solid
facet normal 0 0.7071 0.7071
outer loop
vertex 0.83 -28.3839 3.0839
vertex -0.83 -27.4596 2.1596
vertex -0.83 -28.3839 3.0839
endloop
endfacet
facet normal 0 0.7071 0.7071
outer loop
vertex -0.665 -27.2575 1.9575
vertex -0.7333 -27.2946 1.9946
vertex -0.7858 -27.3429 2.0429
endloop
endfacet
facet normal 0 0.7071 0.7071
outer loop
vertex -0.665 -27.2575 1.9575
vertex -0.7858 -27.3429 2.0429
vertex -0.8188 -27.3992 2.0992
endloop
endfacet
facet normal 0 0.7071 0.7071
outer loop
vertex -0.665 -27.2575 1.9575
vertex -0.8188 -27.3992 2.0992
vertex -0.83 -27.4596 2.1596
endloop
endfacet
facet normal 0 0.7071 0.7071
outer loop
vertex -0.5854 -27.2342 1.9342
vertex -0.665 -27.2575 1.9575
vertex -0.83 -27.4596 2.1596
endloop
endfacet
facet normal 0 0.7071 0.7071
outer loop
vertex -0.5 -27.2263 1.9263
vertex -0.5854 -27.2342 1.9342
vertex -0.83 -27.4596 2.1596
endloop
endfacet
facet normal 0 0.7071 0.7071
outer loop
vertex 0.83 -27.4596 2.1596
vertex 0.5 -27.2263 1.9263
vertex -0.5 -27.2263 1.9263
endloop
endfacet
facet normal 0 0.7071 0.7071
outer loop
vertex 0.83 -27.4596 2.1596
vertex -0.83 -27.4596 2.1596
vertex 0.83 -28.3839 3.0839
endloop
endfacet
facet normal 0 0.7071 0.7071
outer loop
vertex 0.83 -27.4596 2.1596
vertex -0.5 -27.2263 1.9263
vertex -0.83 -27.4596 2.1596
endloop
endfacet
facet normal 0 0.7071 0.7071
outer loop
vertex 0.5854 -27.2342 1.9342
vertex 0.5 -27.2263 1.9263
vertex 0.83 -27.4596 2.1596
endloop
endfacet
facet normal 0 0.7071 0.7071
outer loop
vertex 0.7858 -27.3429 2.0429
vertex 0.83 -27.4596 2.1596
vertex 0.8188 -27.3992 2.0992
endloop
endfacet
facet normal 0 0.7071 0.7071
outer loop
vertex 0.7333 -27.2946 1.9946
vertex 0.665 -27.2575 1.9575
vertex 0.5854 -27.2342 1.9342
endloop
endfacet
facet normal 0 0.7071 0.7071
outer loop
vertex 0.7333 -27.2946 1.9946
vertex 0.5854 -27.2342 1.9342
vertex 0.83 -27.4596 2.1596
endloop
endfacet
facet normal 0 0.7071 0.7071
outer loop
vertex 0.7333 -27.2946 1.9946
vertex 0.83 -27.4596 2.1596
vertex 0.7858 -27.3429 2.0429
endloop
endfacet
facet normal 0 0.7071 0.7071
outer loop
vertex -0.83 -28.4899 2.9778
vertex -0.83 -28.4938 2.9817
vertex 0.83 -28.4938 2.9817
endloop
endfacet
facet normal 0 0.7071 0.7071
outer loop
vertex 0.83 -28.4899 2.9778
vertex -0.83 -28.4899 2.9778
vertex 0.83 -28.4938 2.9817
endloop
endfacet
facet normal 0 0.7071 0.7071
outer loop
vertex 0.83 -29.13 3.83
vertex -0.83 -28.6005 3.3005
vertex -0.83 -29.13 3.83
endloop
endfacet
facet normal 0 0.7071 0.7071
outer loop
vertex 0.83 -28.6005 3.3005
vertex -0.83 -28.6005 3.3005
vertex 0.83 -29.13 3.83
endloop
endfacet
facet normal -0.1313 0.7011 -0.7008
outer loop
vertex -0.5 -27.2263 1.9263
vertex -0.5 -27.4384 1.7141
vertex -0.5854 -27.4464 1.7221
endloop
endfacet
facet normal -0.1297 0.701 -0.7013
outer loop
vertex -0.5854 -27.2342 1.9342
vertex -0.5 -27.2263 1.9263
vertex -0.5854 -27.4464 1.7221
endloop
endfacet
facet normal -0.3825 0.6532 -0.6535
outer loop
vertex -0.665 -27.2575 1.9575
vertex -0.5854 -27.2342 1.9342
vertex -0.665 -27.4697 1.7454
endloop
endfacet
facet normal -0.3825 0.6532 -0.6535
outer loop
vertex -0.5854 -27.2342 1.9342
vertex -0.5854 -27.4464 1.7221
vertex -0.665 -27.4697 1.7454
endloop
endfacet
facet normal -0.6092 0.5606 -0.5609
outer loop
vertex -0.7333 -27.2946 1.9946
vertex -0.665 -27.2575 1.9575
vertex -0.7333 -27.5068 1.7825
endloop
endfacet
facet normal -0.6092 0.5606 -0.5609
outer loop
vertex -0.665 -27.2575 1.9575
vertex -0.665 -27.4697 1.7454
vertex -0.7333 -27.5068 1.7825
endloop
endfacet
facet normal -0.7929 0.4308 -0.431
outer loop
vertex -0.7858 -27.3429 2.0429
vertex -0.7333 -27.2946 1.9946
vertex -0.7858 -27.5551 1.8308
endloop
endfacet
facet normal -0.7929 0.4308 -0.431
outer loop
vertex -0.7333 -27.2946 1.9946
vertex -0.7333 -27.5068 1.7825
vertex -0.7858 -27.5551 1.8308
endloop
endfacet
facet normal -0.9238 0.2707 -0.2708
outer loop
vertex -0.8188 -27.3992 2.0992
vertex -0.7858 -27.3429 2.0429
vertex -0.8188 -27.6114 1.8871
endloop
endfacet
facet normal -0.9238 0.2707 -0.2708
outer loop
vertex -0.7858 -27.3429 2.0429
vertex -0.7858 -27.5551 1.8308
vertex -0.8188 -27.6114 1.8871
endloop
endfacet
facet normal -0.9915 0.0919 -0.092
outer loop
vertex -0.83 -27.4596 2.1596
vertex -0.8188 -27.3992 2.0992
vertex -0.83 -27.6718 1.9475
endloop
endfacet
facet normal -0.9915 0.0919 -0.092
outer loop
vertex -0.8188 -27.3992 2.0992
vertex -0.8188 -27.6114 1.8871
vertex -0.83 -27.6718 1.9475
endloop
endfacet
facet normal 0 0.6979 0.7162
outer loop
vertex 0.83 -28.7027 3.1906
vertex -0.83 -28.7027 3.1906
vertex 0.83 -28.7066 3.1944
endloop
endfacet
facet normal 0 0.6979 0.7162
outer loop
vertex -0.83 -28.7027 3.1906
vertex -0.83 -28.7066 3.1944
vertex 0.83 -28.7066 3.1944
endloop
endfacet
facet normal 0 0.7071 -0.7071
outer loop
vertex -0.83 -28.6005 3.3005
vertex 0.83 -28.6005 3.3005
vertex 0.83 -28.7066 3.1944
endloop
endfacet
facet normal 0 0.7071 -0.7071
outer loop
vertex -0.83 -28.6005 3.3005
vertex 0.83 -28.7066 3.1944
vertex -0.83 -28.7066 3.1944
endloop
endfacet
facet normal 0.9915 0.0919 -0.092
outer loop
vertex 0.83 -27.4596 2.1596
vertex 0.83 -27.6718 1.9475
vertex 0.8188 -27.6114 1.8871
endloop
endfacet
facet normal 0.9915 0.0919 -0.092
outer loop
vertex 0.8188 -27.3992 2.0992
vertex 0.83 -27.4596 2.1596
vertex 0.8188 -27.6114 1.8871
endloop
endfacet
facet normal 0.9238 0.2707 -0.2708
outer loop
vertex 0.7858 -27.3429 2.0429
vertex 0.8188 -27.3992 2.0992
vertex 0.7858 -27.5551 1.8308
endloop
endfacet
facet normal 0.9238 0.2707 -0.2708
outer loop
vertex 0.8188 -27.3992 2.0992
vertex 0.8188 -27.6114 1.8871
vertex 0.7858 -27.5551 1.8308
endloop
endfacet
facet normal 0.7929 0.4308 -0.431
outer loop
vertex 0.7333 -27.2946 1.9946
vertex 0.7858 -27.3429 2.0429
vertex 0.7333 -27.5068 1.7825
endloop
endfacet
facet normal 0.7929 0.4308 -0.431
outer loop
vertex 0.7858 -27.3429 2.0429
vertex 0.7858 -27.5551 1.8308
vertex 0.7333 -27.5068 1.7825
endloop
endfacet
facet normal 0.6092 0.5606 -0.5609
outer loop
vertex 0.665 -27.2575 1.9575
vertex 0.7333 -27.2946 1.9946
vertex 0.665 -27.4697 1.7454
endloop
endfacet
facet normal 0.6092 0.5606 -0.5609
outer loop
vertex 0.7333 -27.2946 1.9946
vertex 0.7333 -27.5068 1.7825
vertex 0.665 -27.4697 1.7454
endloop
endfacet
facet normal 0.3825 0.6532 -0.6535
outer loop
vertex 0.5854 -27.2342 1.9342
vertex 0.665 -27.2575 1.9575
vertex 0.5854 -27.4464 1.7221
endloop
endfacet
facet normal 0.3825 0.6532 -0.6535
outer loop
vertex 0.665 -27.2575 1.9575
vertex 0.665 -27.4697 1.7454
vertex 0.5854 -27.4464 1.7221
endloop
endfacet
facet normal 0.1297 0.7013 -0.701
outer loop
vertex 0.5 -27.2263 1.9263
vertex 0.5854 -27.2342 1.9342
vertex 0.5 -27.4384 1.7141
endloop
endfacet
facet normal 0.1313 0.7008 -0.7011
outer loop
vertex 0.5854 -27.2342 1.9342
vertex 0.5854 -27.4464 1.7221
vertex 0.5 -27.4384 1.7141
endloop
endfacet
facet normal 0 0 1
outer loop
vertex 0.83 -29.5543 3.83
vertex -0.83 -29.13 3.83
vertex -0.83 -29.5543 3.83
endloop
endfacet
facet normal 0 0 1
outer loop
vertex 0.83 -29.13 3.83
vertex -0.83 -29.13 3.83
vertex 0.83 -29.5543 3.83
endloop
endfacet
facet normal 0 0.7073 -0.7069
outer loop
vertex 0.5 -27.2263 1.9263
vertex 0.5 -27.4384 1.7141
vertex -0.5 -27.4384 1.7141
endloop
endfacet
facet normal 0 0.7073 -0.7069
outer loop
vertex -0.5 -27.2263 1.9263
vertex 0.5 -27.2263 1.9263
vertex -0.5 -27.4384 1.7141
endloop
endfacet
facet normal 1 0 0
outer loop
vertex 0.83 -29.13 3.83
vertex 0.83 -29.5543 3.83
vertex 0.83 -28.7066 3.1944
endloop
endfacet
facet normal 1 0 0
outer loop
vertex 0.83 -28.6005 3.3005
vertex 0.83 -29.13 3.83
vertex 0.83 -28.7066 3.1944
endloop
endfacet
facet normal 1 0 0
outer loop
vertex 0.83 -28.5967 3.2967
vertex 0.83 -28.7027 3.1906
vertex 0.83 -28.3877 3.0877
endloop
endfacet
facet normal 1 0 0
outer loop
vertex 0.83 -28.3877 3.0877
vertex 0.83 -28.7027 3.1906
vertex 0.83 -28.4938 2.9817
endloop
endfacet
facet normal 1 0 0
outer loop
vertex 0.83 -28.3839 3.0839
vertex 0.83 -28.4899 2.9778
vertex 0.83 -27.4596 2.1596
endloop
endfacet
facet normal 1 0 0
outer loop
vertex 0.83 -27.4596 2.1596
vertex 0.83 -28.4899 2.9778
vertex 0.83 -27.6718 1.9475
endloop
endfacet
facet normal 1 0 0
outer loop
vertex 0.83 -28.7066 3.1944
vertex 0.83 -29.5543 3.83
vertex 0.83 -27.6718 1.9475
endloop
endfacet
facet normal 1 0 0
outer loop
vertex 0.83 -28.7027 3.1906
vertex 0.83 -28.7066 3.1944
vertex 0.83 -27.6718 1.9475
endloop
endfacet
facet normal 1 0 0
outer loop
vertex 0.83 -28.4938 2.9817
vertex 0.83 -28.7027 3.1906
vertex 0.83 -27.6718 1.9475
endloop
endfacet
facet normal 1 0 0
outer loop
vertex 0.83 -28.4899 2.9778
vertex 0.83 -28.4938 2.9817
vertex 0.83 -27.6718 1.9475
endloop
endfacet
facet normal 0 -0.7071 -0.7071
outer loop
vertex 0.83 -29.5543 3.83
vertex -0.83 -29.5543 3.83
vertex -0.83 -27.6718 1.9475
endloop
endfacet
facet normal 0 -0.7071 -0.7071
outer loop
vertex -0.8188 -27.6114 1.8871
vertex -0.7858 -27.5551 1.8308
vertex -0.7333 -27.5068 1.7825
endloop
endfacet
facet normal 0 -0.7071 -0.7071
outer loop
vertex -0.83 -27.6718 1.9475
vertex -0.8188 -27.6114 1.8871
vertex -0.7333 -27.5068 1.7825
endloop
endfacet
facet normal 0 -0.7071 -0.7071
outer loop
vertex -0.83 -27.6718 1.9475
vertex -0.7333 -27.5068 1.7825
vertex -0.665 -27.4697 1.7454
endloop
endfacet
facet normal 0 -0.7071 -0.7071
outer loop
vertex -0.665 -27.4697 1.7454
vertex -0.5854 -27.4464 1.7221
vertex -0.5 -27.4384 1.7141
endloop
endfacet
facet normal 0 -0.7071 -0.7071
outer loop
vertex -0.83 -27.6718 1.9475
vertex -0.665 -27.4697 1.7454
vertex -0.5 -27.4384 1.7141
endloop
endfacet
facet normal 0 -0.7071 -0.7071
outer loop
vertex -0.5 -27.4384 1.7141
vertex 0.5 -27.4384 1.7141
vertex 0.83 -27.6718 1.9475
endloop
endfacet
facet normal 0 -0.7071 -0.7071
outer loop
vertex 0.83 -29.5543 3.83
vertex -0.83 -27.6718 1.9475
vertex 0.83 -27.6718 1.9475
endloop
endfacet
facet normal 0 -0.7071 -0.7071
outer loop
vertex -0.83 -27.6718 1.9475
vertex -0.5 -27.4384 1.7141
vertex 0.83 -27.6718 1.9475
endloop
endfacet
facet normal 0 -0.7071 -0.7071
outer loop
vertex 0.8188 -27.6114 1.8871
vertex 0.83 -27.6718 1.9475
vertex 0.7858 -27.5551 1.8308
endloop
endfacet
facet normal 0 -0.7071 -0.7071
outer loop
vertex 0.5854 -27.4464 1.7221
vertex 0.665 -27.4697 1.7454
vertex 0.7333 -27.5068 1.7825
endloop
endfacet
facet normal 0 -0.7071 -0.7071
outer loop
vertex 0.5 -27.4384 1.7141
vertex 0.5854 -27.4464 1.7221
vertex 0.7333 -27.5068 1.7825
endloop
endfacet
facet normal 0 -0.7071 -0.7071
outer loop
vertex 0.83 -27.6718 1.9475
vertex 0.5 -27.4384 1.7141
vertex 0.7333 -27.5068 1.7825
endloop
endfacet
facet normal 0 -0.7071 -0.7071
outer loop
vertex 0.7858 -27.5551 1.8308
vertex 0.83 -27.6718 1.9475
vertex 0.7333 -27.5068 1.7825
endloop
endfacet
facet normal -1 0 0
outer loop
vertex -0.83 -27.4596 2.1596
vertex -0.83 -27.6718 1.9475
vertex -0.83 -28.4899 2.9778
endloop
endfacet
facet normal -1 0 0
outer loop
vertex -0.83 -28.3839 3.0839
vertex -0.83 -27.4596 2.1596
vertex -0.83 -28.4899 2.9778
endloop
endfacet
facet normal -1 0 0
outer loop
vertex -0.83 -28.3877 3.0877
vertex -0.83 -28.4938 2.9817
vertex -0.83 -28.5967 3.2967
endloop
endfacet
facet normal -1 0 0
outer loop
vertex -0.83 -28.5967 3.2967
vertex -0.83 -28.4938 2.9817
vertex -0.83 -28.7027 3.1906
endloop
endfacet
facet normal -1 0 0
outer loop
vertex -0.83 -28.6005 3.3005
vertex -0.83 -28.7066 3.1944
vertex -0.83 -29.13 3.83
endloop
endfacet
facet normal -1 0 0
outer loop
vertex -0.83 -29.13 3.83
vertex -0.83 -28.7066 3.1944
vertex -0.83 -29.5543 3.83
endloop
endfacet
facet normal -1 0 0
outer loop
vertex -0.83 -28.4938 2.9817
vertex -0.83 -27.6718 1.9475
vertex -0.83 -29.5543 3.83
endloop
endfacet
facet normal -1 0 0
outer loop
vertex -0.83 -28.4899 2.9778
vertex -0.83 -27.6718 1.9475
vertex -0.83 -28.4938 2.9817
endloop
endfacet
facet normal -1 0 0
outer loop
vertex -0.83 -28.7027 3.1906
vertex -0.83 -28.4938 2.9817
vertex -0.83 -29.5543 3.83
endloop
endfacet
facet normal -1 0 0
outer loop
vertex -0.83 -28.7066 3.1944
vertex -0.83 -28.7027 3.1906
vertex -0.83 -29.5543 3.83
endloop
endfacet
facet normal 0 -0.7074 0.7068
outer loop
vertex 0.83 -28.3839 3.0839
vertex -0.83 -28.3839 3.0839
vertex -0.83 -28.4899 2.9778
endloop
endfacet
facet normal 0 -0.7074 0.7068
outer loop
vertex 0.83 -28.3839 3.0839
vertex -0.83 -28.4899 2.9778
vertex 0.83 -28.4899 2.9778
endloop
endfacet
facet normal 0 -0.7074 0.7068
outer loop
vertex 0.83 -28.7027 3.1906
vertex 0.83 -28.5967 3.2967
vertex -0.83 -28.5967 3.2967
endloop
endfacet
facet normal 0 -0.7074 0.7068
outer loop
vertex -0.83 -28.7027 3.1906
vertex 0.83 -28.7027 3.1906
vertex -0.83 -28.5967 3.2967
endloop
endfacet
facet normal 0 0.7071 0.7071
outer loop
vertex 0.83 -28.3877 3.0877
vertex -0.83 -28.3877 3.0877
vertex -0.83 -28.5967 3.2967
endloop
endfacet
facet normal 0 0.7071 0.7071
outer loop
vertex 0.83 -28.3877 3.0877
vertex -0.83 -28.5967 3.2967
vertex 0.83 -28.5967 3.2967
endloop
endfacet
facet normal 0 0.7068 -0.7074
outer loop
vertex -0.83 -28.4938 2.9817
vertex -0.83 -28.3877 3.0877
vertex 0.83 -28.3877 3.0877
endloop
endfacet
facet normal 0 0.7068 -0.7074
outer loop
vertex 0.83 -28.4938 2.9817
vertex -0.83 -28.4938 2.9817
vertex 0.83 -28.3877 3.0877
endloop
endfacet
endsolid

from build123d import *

# Parameters (mm, degrees)
PAD004_DEPTH    = 0.3
SKETCH021_W     = 3.544396
SKETCH021_H     = 2.825832
POCKET018_DEPTH = 1.17
POCKET020_DEPTH = 0.15


with BuildPart() as part:
    # Sketch020 (on Face1 of Binder003) → Pad004 (new body)
    with BuildSketch(Plane(origin=(0, -12.862132, -12.862132), x_dir=(1, 0, 0), z_dir=(0, 0.707107, 0.707107))):
        with BuildLine():
            Line((-0.83, -20.943965), (-0.83, -24.223965))
            Line((-0.83, -24.223965), (0.83, -24.223965))
            Line((0.83, -24.223965), (0.83, -20.943965))
            ThreePointArc((0.83, -20.943965), (0.733345, -20.710619), (0.5, -20.613965))
            Line((0.5, -20.613965), (-0.5, -20.613965))
            ThreePointArc((-0.5, -20.613965), (-0.733345, -20.710619), (-0.83, -20.943965))
        make_face()
    extrude(amount=PAD004_DEPTH)

    # Sketch021 → Pocket018 (cut)
    with BuildSketch(Plane.XY.offset(5)):
        with Locations((-0.03446, -29.285929)):
            Rectangle(SKETCH021_W, SKETCH021_H)
    extrude(amount=-POCKET018_DEPTH, mode=Mode.SUBTRACT)

    # Sketch024 (on Face4 of Pocket018) → Pocket020 (cut)
    with BuildSketch(Plane(origin=(0, -12.65, -12.65), x_dir=(-1, 0, 0), z_dir=(0, 0.707107, 0.707107))):
        with BuildLine():
            ThreePointArc((0.83, 22.256492), (0.832719, 22.253773), (0.83, 22.251054))
            Line((0.83, 22.251054), (0.276667, 22.251054))
            Line((0.276667, 22.251054), (-0.83, 22.251054))
            ThreePointArc((-0.83, 22.251054), (-0.832719, 22.253773), (-0.83, 22.256492))
            Line((0.276667, 22.256492), (-0.83, 22.256492))
            Line((0.83, 22.256492), (0.276667, 22.256492))
        make_face()
        with BuildLine():
            ThreePointArc((-0.83, 22.551978), (-0.832719, 22.554697), (-0.83, 22.557416))
            Line((-0.83, 22.557416), (-0.276667, 22.557416))
            Line((-0.276667, 22.557416), (0.83, 22.557416))
            ThreePointArc((0.83, 22.557416), (0.832719, 22.554697), (0.83, 22.551978))
            Line((-0.276667, 22.551978), (0.83, 22.551978))
            Line((-0.83, 22.551978), (-0.276667, 22.551978))
        make_face()
    extrude(amount=-POCKET020_DEPTH, mode=Mode.SUBTRACT)


solid = part.part
